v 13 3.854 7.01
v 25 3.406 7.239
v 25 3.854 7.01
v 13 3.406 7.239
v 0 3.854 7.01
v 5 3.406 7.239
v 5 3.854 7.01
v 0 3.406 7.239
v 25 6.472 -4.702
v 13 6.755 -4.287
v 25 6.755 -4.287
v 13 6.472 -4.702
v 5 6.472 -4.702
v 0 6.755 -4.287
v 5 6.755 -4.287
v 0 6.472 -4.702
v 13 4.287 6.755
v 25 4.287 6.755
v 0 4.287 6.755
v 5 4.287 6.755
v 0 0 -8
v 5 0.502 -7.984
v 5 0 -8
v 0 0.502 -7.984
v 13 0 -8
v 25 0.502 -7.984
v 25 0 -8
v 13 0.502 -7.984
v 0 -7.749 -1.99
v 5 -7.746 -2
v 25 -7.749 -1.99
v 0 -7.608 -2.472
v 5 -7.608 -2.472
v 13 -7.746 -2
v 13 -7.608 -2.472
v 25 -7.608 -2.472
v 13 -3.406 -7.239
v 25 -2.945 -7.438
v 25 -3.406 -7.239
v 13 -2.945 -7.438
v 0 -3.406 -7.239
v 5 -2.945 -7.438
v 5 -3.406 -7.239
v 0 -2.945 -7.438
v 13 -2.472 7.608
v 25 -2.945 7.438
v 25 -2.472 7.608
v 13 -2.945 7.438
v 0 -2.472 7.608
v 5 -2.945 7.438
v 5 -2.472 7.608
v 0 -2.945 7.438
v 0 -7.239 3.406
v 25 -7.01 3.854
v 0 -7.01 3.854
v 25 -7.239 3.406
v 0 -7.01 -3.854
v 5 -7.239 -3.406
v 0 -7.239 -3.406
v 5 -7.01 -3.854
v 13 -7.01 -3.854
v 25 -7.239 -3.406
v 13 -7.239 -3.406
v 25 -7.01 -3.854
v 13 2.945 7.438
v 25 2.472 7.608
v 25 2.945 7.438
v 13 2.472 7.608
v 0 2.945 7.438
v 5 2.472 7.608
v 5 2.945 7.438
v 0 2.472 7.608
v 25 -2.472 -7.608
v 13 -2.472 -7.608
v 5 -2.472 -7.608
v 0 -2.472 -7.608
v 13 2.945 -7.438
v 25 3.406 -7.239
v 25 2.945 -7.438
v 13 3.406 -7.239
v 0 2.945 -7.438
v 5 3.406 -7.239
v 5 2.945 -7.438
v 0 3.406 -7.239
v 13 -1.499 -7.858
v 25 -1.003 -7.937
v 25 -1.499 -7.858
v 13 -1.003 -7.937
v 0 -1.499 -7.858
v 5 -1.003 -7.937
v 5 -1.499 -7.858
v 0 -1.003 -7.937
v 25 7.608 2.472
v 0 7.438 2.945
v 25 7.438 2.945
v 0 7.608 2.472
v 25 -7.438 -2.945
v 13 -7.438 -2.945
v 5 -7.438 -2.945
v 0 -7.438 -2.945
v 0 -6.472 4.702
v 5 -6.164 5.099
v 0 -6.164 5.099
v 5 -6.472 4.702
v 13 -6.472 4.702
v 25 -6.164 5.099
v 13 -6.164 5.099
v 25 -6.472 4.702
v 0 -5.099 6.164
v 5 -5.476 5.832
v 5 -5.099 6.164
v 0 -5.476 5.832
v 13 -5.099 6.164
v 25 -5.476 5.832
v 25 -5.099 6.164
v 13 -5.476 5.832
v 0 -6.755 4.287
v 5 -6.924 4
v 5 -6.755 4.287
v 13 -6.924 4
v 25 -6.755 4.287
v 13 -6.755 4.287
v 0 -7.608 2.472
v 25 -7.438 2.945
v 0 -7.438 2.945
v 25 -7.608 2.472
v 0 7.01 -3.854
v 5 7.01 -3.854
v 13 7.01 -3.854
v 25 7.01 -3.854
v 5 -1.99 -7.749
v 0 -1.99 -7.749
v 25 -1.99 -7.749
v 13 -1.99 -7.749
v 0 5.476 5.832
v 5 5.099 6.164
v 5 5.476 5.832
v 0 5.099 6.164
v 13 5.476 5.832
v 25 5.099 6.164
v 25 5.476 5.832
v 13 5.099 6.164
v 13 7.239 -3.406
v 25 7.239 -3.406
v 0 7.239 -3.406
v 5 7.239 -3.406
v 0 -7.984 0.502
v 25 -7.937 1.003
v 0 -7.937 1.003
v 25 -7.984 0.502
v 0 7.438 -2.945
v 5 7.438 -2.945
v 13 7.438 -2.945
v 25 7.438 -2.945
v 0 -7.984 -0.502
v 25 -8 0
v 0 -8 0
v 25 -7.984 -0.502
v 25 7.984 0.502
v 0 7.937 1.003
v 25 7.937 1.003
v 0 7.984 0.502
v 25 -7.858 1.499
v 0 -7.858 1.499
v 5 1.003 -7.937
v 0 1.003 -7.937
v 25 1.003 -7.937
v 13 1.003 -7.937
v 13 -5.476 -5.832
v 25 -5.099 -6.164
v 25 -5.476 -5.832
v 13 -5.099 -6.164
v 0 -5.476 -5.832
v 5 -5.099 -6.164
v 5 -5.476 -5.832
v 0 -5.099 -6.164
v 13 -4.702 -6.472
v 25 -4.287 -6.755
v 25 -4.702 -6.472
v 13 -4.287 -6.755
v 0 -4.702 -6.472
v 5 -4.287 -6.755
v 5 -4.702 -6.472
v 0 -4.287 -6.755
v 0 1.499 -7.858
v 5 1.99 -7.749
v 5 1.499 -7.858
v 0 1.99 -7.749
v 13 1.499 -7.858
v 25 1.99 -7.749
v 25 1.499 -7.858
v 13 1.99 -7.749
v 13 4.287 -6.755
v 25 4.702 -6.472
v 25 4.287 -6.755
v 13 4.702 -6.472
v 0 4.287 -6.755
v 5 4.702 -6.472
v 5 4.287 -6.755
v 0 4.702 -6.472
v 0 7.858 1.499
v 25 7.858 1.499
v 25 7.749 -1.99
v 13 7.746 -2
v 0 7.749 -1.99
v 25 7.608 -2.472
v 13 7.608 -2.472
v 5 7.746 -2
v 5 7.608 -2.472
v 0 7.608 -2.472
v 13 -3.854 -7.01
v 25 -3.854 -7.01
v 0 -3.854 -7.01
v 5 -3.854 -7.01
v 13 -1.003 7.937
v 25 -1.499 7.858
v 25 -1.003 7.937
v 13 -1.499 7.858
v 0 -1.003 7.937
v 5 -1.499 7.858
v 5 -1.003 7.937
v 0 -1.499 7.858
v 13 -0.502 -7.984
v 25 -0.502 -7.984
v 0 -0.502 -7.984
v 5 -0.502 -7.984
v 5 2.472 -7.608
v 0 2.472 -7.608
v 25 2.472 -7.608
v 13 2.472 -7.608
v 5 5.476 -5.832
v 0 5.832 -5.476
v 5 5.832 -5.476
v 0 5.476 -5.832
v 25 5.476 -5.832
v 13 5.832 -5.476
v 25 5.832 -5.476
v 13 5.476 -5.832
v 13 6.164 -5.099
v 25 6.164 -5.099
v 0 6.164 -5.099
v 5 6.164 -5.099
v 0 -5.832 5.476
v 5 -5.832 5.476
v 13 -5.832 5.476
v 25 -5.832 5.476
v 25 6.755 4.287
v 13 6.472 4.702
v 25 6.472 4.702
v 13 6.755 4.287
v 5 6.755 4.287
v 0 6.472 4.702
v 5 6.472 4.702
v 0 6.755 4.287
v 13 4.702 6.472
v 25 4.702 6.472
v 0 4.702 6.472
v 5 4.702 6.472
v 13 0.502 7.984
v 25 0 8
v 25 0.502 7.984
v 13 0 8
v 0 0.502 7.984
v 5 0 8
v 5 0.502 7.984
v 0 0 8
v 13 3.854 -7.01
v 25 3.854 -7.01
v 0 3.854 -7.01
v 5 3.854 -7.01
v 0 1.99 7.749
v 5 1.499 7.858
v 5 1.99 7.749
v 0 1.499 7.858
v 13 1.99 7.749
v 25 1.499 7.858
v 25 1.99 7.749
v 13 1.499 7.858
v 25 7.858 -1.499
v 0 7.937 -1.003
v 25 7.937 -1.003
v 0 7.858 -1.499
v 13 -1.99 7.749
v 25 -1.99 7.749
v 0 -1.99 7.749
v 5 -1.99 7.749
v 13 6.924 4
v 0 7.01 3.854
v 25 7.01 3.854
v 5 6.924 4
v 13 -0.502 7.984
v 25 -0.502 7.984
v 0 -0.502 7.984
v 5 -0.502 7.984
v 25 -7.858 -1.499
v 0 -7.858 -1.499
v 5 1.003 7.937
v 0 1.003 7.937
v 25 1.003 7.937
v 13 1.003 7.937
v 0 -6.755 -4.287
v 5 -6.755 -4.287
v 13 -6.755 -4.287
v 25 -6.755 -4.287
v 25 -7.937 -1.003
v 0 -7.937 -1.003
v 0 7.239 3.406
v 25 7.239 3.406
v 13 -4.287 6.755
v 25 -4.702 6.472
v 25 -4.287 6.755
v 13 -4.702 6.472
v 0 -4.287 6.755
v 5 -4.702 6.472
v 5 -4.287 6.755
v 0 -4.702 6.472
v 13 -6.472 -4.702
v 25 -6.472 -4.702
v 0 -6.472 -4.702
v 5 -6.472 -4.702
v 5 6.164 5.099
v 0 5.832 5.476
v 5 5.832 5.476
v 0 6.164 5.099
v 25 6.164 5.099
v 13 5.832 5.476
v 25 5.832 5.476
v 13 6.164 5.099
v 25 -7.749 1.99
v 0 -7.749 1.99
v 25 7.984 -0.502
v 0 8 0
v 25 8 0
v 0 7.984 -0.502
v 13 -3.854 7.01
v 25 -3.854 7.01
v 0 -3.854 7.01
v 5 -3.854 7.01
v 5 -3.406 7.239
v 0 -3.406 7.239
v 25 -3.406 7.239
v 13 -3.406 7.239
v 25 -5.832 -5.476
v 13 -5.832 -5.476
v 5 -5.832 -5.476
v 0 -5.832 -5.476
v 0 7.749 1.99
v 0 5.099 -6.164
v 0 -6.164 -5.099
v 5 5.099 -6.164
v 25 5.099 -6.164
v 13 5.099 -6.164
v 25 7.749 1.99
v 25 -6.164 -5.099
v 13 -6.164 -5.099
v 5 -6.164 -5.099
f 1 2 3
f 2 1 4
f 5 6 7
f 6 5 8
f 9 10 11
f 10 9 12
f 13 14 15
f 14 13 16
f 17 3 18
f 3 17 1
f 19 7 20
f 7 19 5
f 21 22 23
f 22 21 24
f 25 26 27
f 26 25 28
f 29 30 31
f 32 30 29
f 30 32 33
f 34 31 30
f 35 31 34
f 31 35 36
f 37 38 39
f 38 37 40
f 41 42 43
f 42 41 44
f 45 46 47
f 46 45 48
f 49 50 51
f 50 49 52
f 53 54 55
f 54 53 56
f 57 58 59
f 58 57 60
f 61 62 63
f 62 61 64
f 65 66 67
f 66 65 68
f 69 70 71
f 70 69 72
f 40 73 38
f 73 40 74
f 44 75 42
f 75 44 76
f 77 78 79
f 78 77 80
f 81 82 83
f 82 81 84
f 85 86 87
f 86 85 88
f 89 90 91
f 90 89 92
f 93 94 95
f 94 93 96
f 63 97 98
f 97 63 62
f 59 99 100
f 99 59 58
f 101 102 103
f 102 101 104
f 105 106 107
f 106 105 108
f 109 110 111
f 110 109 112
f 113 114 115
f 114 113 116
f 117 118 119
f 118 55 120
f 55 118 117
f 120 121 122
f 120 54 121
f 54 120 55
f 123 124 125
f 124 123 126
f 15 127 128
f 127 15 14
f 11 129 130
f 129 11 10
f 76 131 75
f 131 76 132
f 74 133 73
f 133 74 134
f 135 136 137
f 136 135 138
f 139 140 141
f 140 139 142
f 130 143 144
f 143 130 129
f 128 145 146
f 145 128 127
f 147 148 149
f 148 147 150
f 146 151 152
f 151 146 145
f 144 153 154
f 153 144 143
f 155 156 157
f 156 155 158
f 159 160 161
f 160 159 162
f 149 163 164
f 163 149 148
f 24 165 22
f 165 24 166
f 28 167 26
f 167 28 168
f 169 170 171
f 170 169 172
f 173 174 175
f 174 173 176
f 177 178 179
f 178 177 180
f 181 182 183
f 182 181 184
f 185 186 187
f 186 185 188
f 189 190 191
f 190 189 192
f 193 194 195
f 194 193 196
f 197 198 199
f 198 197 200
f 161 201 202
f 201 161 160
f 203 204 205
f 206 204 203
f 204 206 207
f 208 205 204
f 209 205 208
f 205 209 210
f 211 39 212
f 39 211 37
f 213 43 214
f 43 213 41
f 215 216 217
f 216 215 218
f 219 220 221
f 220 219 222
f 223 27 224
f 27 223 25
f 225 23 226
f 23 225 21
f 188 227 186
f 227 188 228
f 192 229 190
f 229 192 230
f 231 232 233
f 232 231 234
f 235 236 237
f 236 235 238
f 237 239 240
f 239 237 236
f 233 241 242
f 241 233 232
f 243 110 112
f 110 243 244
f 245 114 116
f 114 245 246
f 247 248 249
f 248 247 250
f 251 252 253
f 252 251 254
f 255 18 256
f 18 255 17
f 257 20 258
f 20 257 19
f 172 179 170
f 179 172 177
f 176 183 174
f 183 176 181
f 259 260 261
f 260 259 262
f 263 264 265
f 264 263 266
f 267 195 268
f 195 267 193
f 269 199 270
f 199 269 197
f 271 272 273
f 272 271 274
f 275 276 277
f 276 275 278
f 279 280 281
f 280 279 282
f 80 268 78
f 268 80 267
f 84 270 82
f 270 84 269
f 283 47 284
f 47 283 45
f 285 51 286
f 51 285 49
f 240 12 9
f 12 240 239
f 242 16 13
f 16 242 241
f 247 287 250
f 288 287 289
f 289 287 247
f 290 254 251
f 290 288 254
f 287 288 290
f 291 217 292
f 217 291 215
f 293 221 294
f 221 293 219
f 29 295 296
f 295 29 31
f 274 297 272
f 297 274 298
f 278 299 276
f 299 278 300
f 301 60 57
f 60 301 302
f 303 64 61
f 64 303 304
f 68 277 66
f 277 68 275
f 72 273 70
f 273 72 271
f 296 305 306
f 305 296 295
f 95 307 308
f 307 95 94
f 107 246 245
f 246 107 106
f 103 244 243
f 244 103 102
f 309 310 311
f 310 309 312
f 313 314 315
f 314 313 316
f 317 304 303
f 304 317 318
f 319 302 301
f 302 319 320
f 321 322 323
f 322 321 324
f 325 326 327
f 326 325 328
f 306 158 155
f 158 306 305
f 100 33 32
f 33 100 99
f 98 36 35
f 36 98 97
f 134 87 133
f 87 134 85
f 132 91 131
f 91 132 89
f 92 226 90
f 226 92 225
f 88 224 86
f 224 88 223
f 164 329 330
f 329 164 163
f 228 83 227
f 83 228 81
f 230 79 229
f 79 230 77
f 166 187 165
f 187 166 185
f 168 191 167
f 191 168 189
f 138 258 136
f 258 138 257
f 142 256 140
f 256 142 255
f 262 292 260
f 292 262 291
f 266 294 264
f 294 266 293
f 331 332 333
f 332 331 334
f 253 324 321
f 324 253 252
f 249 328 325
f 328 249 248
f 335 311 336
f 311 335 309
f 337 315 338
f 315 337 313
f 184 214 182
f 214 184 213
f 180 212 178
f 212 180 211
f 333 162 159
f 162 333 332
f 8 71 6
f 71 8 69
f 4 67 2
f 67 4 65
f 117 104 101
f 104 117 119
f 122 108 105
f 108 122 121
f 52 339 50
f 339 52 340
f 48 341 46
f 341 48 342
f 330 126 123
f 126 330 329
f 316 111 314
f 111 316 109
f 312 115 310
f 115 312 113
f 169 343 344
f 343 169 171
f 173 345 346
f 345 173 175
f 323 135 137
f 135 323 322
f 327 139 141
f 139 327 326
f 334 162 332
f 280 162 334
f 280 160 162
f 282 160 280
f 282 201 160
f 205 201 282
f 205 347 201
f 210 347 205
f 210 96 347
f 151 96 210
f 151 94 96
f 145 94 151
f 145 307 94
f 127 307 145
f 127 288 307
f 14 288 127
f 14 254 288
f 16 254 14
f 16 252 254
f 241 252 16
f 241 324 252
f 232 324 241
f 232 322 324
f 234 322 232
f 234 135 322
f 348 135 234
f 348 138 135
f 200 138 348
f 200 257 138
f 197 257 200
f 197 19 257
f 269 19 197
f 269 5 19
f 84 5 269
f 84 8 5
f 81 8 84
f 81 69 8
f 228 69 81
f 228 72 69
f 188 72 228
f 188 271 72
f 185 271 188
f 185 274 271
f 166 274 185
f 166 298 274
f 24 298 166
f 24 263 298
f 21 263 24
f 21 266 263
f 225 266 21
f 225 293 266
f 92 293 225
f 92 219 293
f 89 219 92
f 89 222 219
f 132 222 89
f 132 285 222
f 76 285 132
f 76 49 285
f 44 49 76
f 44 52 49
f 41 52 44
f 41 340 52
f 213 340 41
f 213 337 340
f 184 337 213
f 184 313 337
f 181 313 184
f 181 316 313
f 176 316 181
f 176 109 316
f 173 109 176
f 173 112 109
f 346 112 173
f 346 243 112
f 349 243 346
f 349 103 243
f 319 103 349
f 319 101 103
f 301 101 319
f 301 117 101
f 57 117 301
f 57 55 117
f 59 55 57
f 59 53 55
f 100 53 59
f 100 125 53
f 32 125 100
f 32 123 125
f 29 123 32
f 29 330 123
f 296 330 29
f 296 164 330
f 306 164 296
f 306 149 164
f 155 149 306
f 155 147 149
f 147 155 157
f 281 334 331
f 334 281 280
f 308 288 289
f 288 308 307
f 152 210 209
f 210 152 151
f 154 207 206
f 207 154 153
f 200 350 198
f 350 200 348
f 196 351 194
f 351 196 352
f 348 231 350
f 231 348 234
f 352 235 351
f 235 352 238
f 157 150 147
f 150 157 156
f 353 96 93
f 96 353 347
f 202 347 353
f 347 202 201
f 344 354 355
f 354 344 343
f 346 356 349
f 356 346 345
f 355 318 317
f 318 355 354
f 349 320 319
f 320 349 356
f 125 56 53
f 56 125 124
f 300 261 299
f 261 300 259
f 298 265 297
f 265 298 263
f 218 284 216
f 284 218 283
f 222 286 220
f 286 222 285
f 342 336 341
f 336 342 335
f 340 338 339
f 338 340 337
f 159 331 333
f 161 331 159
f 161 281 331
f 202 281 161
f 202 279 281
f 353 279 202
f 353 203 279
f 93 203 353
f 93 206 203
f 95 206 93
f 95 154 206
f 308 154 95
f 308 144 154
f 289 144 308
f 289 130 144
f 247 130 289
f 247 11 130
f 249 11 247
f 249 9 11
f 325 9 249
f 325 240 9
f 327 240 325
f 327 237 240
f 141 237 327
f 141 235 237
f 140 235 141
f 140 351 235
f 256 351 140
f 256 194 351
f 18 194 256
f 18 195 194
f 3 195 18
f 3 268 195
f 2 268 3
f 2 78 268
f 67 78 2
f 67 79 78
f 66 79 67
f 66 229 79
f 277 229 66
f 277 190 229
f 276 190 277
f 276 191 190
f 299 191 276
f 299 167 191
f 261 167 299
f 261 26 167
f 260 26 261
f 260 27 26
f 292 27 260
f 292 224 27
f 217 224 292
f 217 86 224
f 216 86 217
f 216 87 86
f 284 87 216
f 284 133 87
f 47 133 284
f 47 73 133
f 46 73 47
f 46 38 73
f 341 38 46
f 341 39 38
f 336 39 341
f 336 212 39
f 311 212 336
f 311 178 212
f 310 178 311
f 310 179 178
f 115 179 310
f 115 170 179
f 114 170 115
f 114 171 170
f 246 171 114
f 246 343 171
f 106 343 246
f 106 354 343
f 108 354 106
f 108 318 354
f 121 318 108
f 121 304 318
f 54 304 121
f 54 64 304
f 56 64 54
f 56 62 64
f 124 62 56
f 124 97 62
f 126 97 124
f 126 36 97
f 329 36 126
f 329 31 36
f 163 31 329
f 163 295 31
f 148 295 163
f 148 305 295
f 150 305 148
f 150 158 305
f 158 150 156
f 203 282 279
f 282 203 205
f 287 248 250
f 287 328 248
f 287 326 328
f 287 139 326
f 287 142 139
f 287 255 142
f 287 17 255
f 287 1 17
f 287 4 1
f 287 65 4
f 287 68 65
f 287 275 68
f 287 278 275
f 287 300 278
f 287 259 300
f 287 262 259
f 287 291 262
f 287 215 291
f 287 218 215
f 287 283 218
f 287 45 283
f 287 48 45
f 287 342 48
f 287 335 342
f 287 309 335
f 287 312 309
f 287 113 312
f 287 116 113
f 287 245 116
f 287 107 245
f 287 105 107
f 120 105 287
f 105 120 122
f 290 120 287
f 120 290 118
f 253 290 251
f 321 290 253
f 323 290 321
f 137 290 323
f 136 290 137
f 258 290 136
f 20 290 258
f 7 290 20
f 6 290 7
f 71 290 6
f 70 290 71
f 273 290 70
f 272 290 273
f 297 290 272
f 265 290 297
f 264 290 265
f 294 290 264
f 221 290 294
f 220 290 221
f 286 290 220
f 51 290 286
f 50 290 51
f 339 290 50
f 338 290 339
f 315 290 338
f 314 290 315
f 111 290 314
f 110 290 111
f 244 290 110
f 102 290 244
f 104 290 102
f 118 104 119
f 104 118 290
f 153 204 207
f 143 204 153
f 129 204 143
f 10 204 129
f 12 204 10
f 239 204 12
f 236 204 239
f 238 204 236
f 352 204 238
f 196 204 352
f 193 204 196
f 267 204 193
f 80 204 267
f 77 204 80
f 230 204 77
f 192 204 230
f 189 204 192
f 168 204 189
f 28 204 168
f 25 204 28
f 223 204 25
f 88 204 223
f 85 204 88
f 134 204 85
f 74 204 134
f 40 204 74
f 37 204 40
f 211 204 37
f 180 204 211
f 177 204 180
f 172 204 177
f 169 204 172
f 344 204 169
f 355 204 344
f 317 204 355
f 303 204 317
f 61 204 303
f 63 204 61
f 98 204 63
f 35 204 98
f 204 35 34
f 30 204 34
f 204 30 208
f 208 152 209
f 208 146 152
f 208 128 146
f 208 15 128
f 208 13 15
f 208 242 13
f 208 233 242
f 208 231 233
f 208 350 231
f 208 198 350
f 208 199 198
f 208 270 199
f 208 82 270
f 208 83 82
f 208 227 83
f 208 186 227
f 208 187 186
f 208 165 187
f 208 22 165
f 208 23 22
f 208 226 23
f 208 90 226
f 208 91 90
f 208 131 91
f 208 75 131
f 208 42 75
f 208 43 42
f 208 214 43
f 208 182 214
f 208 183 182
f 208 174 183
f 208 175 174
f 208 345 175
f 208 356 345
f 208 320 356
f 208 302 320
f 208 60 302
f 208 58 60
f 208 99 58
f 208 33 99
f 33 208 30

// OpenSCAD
module ll(l = 30 , r = 9){
//Lincon Log module
$fn = 100;
difference(){
difference(){
rotate([0,90,0])cylinder(l,r,r);
translate([5,-r,4]) cube([r,2*r,6]);
 
}
translate([5,-r,-r]) cube([r,2*r,6]);  
}
}
ll(25,8);

//translate([60,0,0])rotate(180)ll(4,8);
